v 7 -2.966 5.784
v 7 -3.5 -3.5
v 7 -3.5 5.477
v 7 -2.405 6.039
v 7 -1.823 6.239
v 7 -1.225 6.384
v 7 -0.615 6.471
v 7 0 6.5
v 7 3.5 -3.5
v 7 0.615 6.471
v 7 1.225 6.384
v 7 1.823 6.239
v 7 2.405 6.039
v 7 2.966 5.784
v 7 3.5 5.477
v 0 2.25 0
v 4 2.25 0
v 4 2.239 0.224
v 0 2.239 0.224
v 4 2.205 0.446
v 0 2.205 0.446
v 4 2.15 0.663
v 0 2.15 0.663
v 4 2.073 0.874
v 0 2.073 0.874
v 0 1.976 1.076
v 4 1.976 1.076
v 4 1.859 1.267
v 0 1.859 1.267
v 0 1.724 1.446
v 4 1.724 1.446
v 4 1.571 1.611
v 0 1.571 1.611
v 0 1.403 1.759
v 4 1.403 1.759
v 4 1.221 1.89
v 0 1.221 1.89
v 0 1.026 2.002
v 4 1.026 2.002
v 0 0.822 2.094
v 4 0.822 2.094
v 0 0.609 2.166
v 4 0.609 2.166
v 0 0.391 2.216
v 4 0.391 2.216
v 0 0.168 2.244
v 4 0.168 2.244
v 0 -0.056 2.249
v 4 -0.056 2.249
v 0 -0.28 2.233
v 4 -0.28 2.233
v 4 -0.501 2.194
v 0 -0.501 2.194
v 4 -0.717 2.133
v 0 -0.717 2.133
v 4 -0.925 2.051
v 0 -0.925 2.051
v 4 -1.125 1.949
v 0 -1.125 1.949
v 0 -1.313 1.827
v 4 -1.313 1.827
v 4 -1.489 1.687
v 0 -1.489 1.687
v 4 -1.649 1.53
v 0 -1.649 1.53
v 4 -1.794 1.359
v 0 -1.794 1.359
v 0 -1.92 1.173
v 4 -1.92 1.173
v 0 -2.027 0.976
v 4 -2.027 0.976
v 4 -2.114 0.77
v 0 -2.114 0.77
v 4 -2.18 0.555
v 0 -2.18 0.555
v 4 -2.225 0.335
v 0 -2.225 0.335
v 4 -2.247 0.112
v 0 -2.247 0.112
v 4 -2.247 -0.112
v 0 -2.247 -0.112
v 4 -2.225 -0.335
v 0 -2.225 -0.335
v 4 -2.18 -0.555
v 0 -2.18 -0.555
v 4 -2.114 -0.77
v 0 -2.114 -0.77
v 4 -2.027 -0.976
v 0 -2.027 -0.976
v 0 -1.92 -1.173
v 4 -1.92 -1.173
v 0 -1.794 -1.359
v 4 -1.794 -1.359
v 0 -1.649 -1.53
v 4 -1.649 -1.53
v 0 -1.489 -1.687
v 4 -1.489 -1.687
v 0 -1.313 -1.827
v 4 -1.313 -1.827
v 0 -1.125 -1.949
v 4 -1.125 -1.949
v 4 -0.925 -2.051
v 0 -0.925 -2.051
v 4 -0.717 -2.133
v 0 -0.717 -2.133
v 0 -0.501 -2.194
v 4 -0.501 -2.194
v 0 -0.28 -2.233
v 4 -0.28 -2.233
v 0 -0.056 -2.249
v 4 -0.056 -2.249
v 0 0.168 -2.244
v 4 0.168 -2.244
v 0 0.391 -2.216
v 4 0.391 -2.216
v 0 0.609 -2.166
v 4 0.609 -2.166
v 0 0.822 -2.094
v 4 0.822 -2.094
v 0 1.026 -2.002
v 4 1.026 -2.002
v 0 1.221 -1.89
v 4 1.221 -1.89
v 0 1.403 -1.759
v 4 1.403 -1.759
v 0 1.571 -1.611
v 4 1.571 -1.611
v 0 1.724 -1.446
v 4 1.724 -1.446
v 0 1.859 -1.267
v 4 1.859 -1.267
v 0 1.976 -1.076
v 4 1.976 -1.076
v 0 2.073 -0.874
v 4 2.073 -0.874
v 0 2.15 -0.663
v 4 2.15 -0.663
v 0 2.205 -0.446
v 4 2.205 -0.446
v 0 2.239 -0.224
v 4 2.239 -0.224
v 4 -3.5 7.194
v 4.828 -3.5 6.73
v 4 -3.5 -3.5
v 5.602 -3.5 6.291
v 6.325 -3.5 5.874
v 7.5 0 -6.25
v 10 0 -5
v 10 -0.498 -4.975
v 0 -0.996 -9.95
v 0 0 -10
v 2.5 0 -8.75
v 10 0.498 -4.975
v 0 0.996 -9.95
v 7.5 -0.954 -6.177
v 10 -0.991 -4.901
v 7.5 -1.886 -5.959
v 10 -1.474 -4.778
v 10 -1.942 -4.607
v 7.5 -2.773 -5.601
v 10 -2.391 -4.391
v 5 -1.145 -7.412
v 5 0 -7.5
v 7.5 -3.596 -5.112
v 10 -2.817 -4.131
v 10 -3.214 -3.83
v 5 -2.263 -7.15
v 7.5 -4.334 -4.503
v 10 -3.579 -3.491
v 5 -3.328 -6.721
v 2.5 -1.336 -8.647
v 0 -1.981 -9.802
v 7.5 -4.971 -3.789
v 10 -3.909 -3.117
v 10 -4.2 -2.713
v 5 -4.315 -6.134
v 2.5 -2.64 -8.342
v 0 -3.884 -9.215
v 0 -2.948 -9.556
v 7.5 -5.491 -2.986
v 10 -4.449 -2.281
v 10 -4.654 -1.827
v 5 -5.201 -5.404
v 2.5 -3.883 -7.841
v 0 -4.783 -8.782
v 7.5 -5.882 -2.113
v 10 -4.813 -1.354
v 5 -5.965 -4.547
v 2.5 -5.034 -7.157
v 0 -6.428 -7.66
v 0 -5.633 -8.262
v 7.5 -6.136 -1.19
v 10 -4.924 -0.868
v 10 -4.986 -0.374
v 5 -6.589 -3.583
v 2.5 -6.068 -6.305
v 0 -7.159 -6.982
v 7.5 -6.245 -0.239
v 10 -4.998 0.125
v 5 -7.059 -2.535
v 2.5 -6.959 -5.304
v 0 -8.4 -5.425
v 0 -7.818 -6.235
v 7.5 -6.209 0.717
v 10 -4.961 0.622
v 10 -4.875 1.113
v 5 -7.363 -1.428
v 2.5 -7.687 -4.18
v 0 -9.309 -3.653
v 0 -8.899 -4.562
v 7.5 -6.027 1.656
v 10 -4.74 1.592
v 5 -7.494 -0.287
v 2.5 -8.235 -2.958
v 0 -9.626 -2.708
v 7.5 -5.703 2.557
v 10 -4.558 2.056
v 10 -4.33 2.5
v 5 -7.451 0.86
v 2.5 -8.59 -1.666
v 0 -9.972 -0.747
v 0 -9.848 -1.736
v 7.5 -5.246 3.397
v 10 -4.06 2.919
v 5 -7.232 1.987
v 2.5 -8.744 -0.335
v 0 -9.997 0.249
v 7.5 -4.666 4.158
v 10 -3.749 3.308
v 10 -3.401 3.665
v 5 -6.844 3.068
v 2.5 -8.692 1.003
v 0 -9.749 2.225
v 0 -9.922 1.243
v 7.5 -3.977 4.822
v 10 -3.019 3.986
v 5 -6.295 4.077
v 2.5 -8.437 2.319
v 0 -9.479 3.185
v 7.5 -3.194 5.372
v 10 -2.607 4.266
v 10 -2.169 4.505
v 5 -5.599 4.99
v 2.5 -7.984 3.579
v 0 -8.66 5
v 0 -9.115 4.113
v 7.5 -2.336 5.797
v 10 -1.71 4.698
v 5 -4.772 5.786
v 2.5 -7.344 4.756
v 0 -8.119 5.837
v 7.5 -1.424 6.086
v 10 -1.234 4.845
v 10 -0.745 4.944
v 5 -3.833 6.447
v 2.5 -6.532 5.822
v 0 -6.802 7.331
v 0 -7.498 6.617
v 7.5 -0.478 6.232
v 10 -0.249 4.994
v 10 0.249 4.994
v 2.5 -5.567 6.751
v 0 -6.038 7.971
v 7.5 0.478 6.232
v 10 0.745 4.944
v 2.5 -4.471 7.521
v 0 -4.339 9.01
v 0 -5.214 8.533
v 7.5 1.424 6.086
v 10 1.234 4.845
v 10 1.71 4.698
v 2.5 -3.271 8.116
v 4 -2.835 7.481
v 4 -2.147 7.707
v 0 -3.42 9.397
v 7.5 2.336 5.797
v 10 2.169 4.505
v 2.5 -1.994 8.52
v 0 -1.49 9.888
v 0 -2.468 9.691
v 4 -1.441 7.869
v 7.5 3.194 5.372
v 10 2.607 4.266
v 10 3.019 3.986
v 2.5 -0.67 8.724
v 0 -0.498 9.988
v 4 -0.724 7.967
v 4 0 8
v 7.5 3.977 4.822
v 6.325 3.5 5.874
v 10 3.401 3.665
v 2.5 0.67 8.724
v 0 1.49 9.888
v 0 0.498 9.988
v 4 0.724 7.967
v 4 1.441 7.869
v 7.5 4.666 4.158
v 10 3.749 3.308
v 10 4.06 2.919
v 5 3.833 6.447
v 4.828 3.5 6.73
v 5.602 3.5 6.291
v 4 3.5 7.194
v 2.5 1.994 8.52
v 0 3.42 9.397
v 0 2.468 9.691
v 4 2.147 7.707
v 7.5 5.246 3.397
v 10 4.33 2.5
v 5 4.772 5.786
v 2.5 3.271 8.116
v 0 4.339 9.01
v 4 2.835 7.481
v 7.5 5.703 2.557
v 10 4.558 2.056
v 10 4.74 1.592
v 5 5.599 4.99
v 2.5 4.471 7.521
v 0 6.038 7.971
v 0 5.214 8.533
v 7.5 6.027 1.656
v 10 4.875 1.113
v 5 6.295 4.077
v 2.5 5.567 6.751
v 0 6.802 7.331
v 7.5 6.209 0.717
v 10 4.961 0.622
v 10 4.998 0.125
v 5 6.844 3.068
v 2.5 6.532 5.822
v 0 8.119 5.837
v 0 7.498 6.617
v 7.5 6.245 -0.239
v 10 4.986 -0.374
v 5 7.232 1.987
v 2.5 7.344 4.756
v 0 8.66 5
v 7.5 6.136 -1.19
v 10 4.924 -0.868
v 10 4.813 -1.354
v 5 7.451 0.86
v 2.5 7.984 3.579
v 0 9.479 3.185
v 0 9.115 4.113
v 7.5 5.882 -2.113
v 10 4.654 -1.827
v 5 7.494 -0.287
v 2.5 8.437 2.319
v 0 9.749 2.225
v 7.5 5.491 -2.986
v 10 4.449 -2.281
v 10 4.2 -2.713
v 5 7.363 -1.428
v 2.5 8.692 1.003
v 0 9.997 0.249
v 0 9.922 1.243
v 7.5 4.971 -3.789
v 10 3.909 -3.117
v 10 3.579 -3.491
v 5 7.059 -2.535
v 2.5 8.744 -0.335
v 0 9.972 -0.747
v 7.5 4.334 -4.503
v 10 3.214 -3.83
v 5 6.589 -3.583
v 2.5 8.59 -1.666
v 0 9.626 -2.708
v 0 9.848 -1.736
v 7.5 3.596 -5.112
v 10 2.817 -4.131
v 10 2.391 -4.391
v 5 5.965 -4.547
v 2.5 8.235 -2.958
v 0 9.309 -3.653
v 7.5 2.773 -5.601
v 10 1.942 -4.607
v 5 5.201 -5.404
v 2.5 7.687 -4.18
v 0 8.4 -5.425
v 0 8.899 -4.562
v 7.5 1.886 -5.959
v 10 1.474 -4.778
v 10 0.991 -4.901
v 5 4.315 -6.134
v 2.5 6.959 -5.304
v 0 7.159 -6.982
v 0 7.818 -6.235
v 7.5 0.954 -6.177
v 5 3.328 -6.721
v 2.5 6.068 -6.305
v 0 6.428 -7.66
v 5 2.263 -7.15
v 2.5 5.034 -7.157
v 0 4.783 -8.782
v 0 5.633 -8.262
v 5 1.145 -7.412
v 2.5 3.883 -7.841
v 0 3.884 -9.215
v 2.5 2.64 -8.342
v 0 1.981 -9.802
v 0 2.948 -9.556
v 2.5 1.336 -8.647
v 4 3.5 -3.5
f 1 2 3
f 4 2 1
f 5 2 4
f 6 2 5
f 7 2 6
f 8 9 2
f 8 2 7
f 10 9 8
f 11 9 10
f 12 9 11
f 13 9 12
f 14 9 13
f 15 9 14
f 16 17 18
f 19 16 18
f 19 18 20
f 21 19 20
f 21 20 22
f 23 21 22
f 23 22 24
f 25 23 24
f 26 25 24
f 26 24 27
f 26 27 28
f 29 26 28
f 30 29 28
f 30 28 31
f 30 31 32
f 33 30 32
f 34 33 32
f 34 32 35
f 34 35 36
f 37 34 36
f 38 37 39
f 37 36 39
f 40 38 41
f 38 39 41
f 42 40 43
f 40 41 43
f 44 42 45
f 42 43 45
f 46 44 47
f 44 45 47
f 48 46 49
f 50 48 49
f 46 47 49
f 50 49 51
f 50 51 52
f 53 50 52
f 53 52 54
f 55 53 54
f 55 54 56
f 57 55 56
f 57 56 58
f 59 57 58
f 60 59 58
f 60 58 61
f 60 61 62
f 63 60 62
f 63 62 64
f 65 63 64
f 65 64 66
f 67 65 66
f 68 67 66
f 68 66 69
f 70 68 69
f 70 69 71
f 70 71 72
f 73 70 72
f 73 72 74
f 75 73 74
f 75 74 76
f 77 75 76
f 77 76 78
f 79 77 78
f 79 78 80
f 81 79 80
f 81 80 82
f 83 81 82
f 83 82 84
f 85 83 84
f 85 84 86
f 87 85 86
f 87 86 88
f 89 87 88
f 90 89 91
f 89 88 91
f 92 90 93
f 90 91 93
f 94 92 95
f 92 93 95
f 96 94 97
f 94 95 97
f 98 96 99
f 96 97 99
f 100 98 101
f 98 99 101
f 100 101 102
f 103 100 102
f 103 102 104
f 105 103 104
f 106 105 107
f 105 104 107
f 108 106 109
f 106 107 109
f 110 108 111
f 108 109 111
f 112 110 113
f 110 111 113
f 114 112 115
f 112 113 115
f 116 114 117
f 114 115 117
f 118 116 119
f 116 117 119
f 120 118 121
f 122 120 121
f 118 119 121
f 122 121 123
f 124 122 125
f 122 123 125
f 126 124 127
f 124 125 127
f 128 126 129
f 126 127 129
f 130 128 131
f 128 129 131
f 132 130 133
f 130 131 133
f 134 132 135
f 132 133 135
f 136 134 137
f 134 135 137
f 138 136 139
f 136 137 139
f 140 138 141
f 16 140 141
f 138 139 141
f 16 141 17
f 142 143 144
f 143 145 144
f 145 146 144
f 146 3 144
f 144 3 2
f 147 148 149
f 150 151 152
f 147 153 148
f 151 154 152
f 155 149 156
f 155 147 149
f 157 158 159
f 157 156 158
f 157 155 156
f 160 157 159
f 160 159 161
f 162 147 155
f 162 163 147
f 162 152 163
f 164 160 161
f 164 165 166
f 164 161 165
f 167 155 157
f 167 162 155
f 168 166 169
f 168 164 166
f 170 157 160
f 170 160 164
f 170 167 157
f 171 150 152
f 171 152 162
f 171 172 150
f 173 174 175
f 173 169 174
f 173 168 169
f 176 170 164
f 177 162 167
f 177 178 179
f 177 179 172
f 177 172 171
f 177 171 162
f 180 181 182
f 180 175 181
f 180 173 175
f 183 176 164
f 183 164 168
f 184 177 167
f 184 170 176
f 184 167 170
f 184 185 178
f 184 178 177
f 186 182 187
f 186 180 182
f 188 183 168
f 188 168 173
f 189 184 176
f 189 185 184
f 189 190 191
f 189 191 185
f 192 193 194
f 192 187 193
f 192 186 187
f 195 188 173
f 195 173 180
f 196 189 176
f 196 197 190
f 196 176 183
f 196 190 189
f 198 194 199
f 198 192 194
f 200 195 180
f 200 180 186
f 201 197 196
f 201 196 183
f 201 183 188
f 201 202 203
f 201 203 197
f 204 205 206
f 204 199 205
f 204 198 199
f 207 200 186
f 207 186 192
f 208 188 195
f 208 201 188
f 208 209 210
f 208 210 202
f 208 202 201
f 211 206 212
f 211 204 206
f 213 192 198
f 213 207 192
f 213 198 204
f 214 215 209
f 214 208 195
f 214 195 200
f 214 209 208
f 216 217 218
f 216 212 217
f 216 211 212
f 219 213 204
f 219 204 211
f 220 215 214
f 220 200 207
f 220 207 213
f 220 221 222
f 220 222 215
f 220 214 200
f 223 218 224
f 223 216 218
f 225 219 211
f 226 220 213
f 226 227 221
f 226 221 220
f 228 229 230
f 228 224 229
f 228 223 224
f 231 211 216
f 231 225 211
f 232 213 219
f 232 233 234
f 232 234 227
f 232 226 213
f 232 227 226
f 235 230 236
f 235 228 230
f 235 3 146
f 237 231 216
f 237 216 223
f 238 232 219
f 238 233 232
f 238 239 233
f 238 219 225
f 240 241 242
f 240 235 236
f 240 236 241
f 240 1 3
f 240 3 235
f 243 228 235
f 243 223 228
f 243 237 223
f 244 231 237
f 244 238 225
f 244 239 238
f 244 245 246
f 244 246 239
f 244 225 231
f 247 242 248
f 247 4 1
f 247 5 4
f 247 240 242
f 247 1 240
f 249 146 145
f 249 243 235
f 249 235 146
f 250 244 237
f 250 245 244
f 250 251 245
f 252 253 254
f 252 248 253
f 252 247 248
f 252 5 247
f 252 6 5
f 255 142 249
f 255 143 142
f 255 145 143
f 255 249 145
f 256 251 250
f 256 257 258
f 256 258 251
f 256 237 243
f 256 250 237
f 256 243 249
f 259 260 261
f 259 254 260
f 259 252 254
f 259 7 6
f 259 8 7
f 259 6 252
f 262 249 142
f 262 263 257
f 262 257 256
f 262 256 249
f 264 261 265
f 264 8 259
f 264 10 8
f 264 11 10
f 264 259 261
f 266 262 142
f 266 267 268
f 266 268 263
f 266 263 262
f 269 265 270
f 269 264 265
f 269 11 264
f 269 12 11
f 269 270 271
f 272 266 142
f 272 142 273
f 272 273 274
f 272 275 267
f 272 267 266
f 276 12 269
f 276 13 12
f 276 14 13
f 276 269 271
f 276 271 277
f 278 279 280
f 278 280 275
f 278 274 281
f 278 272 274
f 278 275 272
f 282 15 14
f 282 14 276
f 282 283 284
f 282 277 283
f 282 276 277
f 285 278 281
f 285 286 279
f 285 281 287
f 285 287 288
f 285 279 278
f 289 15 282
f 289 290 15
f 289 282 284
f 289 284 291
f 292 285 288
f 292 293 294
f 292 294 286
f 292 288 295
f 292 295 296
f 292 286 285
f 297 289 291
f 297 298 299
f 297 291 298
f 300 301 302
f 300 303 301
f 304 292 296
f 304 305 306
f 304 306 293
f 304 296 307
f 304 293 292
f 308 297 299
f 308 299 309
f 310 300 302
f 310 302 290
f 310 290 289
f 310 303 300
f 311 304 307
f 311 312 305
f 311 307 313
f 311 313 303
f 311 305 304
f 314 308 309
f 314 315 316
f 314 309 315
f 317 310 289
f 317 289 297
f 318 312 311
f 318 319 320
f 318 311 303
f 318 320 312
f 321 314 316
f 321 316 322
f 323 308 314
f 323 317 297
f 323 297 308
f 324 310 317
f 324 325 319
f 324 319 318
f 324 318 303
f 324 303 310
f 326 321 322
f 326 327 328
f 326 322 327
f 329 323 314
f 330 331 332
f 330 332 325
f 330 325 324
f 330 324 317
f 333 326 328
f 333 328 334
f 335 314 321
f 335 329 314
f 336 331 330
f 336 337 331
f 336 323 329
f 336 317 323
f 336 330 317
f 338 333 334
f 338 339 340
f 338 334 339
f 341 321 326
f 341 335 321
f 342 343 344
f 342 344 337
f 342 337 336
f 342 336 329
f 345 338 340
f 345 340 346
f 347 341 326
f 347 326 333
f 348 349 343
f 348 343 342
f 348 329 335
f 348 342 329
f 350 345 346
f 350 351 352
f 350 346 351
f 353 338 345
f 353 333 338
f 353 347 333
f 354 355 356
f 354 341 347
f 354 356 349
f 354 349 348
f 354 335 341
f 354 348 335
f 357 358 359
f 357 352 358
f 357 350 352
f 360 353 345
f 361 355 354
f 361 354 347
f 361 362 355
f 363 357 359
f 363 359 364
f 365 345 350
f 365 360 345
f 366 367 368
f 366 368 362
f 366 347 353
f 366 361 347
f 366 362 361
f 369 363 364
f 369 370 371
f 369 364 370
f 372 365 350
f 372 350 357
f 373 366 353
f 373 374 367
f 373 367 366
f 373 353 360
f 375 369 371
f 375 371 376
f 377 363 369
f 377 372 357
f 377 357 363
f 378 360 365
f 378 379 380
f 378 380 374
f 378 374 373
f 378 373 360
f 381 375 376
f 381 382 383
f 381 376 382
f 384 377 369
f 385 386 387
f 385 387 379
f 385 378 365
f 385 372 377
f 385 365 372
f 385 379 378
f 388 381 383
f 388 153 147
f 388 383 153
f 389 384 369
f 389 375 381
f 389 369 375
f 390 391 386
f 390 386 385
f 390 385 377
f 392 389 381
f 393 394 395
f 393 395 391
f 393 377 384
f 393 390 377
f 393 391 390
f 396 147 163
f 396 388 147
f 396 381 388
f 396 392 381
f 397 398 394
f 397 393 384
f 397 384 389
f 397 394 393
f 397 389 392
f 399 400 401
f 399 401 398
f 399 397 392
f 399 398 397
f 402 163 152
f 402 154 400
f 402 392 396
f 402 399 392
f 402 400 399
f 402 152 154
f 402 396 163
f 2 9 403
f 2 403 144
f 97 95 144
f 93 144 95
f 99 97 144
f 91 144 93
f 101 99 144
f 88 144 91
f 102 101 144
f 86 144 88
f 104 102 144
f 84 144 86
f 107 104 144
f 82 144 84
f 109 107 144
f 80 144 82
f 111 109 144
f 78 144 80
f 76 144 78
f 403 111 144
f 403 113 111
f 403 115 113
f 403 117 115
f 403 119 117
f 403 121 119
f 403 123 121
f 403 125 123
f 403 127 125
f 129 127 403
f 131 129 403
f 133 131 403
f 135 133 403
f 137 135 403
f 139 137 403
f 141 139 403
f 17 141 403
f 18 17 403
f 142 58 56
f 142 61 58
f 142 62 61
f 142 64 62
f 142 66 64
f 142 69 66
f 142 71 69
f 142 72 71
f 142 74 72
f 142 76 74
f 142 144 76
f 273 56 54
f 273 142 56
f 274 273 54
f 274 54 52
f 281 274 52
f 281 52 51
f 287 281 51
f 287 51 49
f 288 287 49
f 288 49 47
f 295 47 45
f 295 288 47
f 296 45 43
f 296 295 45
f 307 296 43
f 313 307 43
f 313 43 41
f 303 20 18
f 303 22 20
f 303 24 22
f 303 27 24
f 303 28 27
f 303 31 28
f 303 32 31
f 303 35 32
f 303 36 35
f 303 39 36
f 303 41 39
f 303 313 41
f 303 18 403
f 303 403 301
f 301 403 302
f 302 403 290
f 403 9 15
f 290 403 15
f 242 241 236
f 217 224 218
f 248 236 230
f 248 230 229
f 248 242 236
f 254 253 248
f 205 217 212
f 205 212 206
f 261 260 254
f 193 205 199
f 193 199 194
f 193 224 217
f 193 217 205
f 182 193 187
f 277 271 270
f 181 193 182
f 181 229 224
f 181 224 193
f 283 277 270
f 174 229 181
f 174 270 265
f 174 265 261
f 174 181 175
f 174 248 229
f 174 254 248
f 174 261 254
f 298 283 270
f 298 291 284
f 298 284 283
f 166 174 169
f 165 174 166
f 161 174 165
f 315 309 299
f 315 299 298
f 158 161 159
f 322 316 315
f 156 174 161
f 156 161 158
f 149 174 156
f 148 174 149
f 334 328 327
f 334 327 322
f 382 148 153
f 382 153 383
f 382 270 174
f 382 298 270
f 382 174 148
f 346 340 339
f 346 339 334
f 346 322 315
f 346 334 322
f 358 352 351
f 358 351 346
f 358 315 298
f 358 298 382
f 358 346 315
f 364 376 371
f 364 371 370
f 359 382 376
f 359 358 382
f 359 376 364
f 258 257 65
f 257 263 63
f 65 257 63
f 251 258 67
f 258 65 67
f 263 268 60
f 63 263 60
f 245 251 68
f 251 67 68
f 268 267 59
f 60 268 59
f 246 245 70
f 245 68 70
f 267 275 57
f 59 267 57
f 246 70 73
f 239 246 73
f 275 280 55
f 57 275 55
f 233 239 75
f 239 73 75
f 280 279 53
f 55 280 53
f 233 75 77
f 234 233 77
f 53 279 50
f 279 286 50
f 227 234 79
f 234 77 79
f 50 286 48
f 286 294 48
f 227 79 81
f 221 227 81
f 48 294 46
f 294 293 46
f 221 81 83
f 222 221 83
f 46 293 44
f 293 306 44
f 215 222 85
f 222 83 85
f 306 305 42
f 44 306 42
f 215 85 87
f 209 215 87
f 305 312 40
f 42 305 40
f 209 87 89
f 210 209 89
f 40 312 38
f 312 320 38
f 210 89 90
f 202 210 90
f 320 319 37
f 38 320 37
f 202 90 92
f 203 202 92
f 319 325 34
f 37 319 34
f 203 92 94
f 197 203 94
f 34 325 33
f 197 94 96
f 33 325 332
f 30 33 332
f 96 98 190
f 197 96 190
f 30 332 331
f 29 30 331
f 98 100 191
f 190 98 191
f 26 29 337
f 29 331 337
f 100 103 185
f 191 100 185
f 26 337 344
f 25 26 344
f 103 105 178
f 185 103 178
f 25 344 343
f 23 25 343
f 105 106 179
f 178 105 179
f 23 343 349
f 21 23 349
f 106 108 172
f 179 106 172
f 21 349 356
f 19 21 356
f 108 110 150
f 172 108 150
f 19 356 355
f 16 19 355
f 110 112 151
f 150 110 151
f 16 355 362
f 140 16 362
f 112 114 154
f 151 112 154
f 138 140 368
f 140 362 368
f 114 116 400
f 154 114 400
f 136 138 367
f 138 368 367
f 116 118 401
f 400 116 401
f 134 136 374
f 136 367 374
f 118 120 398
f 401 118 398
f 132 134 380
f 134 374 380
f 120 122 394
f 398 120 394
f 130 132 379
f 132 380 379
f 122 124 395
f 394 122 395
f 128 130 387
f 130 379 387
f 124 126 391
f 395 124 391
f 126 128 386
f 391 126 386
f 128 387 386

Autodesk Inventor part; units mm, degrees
ref_plane "XZ Plane" through (0, 0, 0) normal (0, 1, 0) x (-1, 0, 0)
ref_plane "XY Plane" through (0, 0, 0) normal (0, 0, 1) x (1, 0, 0)
ref_plane "Work Plane1" through (7, 0, 0) normal (1, 0, 0) x (0, 1, 0)
sketch "Sketch1" plane through (0, 0, 0) normal (0, 1, 0) x (-1, 0, 0)
  line L0 (0, 0) -> (-10, 0)
  line L1 (0, 0) -> (0, -10)
  line L2 (-10, 0) -> (-10, -5)
  line L3 (-10, -5) -> (0, -10)
  dimension "d0" = 10
  dimension "d1" = 10
  dimension "d2" = 5
revolve "Revolution1" add sketch "Sketch1" angle 360 about axis through (0, 0, 0) along (1, 0, 0)
sketch "Sketch2" plane through (7, 0, 0) normal (1, 0, 0) x (0, 1, 0)
  circle A0 centre (0, 0) radius 2.25
  dimension "d5" = 4.5
extrude "Extrusion1" cut sketch "Sketch2" along normal blind 2 and the other way blind 10
sketch "Sketch3" plane through (7, 0, 0) normal (1, 0, 0) x (0, 1, 0)
  line L0 (-3.5, 3.5) -> (3.5, 3.5)
  line L1 (3.5, 3.5) -> (3.5, -3.5)
  line L2 (3.5, -3.5) -> (-3.5, -3.5)
  line L3 (-3.5, -3.5) -> (-3.5, 3.5)
  line L4 (-3.5, 3.5) -> (3.5, -3.5) construction
  line L5 (3.5, 3.5) -> (-3.5, -3.5) construction
  line L6 (-3.5, 3.5) -> (3.5, 3.5)
  line L7 (3.5, 3.5) -> (3.5, 13.5)
  line L8 (3.5, 13.5) -> (-3.5, 13.5)
  line L9 (-3.5, 13.5) -> (-3.5, 3.5)
  point P0 (0, 0)
  dimension "d18" = 7
  dimension "d19" = 7
  dimension "d20" = 7
  dimension "d21" = 10
extrude "Extrusion2" cut sketch "Sketch3" against normal blind 3
sketch "Sketch5" plane through (9, 0, 0) normal (-1, 0, 0) x (0, 0, 1)
  circle A0 centre (0, 0) radius 2.25 projected
extrude "Extrusion3" add sketch "Sketch5" along normal up to surface (2 mm away)
properties part number "stollen_m4_vierkant"
